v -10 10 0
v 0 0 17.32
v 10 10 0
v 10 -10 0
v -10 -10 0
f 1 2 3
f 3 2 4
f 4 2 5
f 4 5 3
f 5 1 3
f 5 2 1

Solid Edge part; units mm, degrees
sketch "Sketch1" plane through (0, 0, 0) normal (0, 0, 1) x (1, 0, 0)
  line L0 (-10, -10) -> (10, -10)
  line L1 (10, -10) -> (10, 10)
  line L2 (10, 10) -> (-10, 10)
  line L3 (-10, 10) -> (-10, -10)
extrude "Protrusion1" add sketch "Sketch1" along normal blind 41.1686
sketch "Sketch2" plane through (0, 10, 20.5843) normal (0, 1, 0) x (-1, 0, 0)
  line L0 (-10, -20.5843) -> (0, -3.2638)
extrude "ExtrudedCutout_1" cut sketch "Sketch2" along normal mid plane 135.5607 material side at (5.0433, 10, 8.6853)
pattern_circular "Pattern1" count 4 over 360 about axis through (0, 0, 0) along (0, 0, 1) of "ExtrudedCutout_1"
